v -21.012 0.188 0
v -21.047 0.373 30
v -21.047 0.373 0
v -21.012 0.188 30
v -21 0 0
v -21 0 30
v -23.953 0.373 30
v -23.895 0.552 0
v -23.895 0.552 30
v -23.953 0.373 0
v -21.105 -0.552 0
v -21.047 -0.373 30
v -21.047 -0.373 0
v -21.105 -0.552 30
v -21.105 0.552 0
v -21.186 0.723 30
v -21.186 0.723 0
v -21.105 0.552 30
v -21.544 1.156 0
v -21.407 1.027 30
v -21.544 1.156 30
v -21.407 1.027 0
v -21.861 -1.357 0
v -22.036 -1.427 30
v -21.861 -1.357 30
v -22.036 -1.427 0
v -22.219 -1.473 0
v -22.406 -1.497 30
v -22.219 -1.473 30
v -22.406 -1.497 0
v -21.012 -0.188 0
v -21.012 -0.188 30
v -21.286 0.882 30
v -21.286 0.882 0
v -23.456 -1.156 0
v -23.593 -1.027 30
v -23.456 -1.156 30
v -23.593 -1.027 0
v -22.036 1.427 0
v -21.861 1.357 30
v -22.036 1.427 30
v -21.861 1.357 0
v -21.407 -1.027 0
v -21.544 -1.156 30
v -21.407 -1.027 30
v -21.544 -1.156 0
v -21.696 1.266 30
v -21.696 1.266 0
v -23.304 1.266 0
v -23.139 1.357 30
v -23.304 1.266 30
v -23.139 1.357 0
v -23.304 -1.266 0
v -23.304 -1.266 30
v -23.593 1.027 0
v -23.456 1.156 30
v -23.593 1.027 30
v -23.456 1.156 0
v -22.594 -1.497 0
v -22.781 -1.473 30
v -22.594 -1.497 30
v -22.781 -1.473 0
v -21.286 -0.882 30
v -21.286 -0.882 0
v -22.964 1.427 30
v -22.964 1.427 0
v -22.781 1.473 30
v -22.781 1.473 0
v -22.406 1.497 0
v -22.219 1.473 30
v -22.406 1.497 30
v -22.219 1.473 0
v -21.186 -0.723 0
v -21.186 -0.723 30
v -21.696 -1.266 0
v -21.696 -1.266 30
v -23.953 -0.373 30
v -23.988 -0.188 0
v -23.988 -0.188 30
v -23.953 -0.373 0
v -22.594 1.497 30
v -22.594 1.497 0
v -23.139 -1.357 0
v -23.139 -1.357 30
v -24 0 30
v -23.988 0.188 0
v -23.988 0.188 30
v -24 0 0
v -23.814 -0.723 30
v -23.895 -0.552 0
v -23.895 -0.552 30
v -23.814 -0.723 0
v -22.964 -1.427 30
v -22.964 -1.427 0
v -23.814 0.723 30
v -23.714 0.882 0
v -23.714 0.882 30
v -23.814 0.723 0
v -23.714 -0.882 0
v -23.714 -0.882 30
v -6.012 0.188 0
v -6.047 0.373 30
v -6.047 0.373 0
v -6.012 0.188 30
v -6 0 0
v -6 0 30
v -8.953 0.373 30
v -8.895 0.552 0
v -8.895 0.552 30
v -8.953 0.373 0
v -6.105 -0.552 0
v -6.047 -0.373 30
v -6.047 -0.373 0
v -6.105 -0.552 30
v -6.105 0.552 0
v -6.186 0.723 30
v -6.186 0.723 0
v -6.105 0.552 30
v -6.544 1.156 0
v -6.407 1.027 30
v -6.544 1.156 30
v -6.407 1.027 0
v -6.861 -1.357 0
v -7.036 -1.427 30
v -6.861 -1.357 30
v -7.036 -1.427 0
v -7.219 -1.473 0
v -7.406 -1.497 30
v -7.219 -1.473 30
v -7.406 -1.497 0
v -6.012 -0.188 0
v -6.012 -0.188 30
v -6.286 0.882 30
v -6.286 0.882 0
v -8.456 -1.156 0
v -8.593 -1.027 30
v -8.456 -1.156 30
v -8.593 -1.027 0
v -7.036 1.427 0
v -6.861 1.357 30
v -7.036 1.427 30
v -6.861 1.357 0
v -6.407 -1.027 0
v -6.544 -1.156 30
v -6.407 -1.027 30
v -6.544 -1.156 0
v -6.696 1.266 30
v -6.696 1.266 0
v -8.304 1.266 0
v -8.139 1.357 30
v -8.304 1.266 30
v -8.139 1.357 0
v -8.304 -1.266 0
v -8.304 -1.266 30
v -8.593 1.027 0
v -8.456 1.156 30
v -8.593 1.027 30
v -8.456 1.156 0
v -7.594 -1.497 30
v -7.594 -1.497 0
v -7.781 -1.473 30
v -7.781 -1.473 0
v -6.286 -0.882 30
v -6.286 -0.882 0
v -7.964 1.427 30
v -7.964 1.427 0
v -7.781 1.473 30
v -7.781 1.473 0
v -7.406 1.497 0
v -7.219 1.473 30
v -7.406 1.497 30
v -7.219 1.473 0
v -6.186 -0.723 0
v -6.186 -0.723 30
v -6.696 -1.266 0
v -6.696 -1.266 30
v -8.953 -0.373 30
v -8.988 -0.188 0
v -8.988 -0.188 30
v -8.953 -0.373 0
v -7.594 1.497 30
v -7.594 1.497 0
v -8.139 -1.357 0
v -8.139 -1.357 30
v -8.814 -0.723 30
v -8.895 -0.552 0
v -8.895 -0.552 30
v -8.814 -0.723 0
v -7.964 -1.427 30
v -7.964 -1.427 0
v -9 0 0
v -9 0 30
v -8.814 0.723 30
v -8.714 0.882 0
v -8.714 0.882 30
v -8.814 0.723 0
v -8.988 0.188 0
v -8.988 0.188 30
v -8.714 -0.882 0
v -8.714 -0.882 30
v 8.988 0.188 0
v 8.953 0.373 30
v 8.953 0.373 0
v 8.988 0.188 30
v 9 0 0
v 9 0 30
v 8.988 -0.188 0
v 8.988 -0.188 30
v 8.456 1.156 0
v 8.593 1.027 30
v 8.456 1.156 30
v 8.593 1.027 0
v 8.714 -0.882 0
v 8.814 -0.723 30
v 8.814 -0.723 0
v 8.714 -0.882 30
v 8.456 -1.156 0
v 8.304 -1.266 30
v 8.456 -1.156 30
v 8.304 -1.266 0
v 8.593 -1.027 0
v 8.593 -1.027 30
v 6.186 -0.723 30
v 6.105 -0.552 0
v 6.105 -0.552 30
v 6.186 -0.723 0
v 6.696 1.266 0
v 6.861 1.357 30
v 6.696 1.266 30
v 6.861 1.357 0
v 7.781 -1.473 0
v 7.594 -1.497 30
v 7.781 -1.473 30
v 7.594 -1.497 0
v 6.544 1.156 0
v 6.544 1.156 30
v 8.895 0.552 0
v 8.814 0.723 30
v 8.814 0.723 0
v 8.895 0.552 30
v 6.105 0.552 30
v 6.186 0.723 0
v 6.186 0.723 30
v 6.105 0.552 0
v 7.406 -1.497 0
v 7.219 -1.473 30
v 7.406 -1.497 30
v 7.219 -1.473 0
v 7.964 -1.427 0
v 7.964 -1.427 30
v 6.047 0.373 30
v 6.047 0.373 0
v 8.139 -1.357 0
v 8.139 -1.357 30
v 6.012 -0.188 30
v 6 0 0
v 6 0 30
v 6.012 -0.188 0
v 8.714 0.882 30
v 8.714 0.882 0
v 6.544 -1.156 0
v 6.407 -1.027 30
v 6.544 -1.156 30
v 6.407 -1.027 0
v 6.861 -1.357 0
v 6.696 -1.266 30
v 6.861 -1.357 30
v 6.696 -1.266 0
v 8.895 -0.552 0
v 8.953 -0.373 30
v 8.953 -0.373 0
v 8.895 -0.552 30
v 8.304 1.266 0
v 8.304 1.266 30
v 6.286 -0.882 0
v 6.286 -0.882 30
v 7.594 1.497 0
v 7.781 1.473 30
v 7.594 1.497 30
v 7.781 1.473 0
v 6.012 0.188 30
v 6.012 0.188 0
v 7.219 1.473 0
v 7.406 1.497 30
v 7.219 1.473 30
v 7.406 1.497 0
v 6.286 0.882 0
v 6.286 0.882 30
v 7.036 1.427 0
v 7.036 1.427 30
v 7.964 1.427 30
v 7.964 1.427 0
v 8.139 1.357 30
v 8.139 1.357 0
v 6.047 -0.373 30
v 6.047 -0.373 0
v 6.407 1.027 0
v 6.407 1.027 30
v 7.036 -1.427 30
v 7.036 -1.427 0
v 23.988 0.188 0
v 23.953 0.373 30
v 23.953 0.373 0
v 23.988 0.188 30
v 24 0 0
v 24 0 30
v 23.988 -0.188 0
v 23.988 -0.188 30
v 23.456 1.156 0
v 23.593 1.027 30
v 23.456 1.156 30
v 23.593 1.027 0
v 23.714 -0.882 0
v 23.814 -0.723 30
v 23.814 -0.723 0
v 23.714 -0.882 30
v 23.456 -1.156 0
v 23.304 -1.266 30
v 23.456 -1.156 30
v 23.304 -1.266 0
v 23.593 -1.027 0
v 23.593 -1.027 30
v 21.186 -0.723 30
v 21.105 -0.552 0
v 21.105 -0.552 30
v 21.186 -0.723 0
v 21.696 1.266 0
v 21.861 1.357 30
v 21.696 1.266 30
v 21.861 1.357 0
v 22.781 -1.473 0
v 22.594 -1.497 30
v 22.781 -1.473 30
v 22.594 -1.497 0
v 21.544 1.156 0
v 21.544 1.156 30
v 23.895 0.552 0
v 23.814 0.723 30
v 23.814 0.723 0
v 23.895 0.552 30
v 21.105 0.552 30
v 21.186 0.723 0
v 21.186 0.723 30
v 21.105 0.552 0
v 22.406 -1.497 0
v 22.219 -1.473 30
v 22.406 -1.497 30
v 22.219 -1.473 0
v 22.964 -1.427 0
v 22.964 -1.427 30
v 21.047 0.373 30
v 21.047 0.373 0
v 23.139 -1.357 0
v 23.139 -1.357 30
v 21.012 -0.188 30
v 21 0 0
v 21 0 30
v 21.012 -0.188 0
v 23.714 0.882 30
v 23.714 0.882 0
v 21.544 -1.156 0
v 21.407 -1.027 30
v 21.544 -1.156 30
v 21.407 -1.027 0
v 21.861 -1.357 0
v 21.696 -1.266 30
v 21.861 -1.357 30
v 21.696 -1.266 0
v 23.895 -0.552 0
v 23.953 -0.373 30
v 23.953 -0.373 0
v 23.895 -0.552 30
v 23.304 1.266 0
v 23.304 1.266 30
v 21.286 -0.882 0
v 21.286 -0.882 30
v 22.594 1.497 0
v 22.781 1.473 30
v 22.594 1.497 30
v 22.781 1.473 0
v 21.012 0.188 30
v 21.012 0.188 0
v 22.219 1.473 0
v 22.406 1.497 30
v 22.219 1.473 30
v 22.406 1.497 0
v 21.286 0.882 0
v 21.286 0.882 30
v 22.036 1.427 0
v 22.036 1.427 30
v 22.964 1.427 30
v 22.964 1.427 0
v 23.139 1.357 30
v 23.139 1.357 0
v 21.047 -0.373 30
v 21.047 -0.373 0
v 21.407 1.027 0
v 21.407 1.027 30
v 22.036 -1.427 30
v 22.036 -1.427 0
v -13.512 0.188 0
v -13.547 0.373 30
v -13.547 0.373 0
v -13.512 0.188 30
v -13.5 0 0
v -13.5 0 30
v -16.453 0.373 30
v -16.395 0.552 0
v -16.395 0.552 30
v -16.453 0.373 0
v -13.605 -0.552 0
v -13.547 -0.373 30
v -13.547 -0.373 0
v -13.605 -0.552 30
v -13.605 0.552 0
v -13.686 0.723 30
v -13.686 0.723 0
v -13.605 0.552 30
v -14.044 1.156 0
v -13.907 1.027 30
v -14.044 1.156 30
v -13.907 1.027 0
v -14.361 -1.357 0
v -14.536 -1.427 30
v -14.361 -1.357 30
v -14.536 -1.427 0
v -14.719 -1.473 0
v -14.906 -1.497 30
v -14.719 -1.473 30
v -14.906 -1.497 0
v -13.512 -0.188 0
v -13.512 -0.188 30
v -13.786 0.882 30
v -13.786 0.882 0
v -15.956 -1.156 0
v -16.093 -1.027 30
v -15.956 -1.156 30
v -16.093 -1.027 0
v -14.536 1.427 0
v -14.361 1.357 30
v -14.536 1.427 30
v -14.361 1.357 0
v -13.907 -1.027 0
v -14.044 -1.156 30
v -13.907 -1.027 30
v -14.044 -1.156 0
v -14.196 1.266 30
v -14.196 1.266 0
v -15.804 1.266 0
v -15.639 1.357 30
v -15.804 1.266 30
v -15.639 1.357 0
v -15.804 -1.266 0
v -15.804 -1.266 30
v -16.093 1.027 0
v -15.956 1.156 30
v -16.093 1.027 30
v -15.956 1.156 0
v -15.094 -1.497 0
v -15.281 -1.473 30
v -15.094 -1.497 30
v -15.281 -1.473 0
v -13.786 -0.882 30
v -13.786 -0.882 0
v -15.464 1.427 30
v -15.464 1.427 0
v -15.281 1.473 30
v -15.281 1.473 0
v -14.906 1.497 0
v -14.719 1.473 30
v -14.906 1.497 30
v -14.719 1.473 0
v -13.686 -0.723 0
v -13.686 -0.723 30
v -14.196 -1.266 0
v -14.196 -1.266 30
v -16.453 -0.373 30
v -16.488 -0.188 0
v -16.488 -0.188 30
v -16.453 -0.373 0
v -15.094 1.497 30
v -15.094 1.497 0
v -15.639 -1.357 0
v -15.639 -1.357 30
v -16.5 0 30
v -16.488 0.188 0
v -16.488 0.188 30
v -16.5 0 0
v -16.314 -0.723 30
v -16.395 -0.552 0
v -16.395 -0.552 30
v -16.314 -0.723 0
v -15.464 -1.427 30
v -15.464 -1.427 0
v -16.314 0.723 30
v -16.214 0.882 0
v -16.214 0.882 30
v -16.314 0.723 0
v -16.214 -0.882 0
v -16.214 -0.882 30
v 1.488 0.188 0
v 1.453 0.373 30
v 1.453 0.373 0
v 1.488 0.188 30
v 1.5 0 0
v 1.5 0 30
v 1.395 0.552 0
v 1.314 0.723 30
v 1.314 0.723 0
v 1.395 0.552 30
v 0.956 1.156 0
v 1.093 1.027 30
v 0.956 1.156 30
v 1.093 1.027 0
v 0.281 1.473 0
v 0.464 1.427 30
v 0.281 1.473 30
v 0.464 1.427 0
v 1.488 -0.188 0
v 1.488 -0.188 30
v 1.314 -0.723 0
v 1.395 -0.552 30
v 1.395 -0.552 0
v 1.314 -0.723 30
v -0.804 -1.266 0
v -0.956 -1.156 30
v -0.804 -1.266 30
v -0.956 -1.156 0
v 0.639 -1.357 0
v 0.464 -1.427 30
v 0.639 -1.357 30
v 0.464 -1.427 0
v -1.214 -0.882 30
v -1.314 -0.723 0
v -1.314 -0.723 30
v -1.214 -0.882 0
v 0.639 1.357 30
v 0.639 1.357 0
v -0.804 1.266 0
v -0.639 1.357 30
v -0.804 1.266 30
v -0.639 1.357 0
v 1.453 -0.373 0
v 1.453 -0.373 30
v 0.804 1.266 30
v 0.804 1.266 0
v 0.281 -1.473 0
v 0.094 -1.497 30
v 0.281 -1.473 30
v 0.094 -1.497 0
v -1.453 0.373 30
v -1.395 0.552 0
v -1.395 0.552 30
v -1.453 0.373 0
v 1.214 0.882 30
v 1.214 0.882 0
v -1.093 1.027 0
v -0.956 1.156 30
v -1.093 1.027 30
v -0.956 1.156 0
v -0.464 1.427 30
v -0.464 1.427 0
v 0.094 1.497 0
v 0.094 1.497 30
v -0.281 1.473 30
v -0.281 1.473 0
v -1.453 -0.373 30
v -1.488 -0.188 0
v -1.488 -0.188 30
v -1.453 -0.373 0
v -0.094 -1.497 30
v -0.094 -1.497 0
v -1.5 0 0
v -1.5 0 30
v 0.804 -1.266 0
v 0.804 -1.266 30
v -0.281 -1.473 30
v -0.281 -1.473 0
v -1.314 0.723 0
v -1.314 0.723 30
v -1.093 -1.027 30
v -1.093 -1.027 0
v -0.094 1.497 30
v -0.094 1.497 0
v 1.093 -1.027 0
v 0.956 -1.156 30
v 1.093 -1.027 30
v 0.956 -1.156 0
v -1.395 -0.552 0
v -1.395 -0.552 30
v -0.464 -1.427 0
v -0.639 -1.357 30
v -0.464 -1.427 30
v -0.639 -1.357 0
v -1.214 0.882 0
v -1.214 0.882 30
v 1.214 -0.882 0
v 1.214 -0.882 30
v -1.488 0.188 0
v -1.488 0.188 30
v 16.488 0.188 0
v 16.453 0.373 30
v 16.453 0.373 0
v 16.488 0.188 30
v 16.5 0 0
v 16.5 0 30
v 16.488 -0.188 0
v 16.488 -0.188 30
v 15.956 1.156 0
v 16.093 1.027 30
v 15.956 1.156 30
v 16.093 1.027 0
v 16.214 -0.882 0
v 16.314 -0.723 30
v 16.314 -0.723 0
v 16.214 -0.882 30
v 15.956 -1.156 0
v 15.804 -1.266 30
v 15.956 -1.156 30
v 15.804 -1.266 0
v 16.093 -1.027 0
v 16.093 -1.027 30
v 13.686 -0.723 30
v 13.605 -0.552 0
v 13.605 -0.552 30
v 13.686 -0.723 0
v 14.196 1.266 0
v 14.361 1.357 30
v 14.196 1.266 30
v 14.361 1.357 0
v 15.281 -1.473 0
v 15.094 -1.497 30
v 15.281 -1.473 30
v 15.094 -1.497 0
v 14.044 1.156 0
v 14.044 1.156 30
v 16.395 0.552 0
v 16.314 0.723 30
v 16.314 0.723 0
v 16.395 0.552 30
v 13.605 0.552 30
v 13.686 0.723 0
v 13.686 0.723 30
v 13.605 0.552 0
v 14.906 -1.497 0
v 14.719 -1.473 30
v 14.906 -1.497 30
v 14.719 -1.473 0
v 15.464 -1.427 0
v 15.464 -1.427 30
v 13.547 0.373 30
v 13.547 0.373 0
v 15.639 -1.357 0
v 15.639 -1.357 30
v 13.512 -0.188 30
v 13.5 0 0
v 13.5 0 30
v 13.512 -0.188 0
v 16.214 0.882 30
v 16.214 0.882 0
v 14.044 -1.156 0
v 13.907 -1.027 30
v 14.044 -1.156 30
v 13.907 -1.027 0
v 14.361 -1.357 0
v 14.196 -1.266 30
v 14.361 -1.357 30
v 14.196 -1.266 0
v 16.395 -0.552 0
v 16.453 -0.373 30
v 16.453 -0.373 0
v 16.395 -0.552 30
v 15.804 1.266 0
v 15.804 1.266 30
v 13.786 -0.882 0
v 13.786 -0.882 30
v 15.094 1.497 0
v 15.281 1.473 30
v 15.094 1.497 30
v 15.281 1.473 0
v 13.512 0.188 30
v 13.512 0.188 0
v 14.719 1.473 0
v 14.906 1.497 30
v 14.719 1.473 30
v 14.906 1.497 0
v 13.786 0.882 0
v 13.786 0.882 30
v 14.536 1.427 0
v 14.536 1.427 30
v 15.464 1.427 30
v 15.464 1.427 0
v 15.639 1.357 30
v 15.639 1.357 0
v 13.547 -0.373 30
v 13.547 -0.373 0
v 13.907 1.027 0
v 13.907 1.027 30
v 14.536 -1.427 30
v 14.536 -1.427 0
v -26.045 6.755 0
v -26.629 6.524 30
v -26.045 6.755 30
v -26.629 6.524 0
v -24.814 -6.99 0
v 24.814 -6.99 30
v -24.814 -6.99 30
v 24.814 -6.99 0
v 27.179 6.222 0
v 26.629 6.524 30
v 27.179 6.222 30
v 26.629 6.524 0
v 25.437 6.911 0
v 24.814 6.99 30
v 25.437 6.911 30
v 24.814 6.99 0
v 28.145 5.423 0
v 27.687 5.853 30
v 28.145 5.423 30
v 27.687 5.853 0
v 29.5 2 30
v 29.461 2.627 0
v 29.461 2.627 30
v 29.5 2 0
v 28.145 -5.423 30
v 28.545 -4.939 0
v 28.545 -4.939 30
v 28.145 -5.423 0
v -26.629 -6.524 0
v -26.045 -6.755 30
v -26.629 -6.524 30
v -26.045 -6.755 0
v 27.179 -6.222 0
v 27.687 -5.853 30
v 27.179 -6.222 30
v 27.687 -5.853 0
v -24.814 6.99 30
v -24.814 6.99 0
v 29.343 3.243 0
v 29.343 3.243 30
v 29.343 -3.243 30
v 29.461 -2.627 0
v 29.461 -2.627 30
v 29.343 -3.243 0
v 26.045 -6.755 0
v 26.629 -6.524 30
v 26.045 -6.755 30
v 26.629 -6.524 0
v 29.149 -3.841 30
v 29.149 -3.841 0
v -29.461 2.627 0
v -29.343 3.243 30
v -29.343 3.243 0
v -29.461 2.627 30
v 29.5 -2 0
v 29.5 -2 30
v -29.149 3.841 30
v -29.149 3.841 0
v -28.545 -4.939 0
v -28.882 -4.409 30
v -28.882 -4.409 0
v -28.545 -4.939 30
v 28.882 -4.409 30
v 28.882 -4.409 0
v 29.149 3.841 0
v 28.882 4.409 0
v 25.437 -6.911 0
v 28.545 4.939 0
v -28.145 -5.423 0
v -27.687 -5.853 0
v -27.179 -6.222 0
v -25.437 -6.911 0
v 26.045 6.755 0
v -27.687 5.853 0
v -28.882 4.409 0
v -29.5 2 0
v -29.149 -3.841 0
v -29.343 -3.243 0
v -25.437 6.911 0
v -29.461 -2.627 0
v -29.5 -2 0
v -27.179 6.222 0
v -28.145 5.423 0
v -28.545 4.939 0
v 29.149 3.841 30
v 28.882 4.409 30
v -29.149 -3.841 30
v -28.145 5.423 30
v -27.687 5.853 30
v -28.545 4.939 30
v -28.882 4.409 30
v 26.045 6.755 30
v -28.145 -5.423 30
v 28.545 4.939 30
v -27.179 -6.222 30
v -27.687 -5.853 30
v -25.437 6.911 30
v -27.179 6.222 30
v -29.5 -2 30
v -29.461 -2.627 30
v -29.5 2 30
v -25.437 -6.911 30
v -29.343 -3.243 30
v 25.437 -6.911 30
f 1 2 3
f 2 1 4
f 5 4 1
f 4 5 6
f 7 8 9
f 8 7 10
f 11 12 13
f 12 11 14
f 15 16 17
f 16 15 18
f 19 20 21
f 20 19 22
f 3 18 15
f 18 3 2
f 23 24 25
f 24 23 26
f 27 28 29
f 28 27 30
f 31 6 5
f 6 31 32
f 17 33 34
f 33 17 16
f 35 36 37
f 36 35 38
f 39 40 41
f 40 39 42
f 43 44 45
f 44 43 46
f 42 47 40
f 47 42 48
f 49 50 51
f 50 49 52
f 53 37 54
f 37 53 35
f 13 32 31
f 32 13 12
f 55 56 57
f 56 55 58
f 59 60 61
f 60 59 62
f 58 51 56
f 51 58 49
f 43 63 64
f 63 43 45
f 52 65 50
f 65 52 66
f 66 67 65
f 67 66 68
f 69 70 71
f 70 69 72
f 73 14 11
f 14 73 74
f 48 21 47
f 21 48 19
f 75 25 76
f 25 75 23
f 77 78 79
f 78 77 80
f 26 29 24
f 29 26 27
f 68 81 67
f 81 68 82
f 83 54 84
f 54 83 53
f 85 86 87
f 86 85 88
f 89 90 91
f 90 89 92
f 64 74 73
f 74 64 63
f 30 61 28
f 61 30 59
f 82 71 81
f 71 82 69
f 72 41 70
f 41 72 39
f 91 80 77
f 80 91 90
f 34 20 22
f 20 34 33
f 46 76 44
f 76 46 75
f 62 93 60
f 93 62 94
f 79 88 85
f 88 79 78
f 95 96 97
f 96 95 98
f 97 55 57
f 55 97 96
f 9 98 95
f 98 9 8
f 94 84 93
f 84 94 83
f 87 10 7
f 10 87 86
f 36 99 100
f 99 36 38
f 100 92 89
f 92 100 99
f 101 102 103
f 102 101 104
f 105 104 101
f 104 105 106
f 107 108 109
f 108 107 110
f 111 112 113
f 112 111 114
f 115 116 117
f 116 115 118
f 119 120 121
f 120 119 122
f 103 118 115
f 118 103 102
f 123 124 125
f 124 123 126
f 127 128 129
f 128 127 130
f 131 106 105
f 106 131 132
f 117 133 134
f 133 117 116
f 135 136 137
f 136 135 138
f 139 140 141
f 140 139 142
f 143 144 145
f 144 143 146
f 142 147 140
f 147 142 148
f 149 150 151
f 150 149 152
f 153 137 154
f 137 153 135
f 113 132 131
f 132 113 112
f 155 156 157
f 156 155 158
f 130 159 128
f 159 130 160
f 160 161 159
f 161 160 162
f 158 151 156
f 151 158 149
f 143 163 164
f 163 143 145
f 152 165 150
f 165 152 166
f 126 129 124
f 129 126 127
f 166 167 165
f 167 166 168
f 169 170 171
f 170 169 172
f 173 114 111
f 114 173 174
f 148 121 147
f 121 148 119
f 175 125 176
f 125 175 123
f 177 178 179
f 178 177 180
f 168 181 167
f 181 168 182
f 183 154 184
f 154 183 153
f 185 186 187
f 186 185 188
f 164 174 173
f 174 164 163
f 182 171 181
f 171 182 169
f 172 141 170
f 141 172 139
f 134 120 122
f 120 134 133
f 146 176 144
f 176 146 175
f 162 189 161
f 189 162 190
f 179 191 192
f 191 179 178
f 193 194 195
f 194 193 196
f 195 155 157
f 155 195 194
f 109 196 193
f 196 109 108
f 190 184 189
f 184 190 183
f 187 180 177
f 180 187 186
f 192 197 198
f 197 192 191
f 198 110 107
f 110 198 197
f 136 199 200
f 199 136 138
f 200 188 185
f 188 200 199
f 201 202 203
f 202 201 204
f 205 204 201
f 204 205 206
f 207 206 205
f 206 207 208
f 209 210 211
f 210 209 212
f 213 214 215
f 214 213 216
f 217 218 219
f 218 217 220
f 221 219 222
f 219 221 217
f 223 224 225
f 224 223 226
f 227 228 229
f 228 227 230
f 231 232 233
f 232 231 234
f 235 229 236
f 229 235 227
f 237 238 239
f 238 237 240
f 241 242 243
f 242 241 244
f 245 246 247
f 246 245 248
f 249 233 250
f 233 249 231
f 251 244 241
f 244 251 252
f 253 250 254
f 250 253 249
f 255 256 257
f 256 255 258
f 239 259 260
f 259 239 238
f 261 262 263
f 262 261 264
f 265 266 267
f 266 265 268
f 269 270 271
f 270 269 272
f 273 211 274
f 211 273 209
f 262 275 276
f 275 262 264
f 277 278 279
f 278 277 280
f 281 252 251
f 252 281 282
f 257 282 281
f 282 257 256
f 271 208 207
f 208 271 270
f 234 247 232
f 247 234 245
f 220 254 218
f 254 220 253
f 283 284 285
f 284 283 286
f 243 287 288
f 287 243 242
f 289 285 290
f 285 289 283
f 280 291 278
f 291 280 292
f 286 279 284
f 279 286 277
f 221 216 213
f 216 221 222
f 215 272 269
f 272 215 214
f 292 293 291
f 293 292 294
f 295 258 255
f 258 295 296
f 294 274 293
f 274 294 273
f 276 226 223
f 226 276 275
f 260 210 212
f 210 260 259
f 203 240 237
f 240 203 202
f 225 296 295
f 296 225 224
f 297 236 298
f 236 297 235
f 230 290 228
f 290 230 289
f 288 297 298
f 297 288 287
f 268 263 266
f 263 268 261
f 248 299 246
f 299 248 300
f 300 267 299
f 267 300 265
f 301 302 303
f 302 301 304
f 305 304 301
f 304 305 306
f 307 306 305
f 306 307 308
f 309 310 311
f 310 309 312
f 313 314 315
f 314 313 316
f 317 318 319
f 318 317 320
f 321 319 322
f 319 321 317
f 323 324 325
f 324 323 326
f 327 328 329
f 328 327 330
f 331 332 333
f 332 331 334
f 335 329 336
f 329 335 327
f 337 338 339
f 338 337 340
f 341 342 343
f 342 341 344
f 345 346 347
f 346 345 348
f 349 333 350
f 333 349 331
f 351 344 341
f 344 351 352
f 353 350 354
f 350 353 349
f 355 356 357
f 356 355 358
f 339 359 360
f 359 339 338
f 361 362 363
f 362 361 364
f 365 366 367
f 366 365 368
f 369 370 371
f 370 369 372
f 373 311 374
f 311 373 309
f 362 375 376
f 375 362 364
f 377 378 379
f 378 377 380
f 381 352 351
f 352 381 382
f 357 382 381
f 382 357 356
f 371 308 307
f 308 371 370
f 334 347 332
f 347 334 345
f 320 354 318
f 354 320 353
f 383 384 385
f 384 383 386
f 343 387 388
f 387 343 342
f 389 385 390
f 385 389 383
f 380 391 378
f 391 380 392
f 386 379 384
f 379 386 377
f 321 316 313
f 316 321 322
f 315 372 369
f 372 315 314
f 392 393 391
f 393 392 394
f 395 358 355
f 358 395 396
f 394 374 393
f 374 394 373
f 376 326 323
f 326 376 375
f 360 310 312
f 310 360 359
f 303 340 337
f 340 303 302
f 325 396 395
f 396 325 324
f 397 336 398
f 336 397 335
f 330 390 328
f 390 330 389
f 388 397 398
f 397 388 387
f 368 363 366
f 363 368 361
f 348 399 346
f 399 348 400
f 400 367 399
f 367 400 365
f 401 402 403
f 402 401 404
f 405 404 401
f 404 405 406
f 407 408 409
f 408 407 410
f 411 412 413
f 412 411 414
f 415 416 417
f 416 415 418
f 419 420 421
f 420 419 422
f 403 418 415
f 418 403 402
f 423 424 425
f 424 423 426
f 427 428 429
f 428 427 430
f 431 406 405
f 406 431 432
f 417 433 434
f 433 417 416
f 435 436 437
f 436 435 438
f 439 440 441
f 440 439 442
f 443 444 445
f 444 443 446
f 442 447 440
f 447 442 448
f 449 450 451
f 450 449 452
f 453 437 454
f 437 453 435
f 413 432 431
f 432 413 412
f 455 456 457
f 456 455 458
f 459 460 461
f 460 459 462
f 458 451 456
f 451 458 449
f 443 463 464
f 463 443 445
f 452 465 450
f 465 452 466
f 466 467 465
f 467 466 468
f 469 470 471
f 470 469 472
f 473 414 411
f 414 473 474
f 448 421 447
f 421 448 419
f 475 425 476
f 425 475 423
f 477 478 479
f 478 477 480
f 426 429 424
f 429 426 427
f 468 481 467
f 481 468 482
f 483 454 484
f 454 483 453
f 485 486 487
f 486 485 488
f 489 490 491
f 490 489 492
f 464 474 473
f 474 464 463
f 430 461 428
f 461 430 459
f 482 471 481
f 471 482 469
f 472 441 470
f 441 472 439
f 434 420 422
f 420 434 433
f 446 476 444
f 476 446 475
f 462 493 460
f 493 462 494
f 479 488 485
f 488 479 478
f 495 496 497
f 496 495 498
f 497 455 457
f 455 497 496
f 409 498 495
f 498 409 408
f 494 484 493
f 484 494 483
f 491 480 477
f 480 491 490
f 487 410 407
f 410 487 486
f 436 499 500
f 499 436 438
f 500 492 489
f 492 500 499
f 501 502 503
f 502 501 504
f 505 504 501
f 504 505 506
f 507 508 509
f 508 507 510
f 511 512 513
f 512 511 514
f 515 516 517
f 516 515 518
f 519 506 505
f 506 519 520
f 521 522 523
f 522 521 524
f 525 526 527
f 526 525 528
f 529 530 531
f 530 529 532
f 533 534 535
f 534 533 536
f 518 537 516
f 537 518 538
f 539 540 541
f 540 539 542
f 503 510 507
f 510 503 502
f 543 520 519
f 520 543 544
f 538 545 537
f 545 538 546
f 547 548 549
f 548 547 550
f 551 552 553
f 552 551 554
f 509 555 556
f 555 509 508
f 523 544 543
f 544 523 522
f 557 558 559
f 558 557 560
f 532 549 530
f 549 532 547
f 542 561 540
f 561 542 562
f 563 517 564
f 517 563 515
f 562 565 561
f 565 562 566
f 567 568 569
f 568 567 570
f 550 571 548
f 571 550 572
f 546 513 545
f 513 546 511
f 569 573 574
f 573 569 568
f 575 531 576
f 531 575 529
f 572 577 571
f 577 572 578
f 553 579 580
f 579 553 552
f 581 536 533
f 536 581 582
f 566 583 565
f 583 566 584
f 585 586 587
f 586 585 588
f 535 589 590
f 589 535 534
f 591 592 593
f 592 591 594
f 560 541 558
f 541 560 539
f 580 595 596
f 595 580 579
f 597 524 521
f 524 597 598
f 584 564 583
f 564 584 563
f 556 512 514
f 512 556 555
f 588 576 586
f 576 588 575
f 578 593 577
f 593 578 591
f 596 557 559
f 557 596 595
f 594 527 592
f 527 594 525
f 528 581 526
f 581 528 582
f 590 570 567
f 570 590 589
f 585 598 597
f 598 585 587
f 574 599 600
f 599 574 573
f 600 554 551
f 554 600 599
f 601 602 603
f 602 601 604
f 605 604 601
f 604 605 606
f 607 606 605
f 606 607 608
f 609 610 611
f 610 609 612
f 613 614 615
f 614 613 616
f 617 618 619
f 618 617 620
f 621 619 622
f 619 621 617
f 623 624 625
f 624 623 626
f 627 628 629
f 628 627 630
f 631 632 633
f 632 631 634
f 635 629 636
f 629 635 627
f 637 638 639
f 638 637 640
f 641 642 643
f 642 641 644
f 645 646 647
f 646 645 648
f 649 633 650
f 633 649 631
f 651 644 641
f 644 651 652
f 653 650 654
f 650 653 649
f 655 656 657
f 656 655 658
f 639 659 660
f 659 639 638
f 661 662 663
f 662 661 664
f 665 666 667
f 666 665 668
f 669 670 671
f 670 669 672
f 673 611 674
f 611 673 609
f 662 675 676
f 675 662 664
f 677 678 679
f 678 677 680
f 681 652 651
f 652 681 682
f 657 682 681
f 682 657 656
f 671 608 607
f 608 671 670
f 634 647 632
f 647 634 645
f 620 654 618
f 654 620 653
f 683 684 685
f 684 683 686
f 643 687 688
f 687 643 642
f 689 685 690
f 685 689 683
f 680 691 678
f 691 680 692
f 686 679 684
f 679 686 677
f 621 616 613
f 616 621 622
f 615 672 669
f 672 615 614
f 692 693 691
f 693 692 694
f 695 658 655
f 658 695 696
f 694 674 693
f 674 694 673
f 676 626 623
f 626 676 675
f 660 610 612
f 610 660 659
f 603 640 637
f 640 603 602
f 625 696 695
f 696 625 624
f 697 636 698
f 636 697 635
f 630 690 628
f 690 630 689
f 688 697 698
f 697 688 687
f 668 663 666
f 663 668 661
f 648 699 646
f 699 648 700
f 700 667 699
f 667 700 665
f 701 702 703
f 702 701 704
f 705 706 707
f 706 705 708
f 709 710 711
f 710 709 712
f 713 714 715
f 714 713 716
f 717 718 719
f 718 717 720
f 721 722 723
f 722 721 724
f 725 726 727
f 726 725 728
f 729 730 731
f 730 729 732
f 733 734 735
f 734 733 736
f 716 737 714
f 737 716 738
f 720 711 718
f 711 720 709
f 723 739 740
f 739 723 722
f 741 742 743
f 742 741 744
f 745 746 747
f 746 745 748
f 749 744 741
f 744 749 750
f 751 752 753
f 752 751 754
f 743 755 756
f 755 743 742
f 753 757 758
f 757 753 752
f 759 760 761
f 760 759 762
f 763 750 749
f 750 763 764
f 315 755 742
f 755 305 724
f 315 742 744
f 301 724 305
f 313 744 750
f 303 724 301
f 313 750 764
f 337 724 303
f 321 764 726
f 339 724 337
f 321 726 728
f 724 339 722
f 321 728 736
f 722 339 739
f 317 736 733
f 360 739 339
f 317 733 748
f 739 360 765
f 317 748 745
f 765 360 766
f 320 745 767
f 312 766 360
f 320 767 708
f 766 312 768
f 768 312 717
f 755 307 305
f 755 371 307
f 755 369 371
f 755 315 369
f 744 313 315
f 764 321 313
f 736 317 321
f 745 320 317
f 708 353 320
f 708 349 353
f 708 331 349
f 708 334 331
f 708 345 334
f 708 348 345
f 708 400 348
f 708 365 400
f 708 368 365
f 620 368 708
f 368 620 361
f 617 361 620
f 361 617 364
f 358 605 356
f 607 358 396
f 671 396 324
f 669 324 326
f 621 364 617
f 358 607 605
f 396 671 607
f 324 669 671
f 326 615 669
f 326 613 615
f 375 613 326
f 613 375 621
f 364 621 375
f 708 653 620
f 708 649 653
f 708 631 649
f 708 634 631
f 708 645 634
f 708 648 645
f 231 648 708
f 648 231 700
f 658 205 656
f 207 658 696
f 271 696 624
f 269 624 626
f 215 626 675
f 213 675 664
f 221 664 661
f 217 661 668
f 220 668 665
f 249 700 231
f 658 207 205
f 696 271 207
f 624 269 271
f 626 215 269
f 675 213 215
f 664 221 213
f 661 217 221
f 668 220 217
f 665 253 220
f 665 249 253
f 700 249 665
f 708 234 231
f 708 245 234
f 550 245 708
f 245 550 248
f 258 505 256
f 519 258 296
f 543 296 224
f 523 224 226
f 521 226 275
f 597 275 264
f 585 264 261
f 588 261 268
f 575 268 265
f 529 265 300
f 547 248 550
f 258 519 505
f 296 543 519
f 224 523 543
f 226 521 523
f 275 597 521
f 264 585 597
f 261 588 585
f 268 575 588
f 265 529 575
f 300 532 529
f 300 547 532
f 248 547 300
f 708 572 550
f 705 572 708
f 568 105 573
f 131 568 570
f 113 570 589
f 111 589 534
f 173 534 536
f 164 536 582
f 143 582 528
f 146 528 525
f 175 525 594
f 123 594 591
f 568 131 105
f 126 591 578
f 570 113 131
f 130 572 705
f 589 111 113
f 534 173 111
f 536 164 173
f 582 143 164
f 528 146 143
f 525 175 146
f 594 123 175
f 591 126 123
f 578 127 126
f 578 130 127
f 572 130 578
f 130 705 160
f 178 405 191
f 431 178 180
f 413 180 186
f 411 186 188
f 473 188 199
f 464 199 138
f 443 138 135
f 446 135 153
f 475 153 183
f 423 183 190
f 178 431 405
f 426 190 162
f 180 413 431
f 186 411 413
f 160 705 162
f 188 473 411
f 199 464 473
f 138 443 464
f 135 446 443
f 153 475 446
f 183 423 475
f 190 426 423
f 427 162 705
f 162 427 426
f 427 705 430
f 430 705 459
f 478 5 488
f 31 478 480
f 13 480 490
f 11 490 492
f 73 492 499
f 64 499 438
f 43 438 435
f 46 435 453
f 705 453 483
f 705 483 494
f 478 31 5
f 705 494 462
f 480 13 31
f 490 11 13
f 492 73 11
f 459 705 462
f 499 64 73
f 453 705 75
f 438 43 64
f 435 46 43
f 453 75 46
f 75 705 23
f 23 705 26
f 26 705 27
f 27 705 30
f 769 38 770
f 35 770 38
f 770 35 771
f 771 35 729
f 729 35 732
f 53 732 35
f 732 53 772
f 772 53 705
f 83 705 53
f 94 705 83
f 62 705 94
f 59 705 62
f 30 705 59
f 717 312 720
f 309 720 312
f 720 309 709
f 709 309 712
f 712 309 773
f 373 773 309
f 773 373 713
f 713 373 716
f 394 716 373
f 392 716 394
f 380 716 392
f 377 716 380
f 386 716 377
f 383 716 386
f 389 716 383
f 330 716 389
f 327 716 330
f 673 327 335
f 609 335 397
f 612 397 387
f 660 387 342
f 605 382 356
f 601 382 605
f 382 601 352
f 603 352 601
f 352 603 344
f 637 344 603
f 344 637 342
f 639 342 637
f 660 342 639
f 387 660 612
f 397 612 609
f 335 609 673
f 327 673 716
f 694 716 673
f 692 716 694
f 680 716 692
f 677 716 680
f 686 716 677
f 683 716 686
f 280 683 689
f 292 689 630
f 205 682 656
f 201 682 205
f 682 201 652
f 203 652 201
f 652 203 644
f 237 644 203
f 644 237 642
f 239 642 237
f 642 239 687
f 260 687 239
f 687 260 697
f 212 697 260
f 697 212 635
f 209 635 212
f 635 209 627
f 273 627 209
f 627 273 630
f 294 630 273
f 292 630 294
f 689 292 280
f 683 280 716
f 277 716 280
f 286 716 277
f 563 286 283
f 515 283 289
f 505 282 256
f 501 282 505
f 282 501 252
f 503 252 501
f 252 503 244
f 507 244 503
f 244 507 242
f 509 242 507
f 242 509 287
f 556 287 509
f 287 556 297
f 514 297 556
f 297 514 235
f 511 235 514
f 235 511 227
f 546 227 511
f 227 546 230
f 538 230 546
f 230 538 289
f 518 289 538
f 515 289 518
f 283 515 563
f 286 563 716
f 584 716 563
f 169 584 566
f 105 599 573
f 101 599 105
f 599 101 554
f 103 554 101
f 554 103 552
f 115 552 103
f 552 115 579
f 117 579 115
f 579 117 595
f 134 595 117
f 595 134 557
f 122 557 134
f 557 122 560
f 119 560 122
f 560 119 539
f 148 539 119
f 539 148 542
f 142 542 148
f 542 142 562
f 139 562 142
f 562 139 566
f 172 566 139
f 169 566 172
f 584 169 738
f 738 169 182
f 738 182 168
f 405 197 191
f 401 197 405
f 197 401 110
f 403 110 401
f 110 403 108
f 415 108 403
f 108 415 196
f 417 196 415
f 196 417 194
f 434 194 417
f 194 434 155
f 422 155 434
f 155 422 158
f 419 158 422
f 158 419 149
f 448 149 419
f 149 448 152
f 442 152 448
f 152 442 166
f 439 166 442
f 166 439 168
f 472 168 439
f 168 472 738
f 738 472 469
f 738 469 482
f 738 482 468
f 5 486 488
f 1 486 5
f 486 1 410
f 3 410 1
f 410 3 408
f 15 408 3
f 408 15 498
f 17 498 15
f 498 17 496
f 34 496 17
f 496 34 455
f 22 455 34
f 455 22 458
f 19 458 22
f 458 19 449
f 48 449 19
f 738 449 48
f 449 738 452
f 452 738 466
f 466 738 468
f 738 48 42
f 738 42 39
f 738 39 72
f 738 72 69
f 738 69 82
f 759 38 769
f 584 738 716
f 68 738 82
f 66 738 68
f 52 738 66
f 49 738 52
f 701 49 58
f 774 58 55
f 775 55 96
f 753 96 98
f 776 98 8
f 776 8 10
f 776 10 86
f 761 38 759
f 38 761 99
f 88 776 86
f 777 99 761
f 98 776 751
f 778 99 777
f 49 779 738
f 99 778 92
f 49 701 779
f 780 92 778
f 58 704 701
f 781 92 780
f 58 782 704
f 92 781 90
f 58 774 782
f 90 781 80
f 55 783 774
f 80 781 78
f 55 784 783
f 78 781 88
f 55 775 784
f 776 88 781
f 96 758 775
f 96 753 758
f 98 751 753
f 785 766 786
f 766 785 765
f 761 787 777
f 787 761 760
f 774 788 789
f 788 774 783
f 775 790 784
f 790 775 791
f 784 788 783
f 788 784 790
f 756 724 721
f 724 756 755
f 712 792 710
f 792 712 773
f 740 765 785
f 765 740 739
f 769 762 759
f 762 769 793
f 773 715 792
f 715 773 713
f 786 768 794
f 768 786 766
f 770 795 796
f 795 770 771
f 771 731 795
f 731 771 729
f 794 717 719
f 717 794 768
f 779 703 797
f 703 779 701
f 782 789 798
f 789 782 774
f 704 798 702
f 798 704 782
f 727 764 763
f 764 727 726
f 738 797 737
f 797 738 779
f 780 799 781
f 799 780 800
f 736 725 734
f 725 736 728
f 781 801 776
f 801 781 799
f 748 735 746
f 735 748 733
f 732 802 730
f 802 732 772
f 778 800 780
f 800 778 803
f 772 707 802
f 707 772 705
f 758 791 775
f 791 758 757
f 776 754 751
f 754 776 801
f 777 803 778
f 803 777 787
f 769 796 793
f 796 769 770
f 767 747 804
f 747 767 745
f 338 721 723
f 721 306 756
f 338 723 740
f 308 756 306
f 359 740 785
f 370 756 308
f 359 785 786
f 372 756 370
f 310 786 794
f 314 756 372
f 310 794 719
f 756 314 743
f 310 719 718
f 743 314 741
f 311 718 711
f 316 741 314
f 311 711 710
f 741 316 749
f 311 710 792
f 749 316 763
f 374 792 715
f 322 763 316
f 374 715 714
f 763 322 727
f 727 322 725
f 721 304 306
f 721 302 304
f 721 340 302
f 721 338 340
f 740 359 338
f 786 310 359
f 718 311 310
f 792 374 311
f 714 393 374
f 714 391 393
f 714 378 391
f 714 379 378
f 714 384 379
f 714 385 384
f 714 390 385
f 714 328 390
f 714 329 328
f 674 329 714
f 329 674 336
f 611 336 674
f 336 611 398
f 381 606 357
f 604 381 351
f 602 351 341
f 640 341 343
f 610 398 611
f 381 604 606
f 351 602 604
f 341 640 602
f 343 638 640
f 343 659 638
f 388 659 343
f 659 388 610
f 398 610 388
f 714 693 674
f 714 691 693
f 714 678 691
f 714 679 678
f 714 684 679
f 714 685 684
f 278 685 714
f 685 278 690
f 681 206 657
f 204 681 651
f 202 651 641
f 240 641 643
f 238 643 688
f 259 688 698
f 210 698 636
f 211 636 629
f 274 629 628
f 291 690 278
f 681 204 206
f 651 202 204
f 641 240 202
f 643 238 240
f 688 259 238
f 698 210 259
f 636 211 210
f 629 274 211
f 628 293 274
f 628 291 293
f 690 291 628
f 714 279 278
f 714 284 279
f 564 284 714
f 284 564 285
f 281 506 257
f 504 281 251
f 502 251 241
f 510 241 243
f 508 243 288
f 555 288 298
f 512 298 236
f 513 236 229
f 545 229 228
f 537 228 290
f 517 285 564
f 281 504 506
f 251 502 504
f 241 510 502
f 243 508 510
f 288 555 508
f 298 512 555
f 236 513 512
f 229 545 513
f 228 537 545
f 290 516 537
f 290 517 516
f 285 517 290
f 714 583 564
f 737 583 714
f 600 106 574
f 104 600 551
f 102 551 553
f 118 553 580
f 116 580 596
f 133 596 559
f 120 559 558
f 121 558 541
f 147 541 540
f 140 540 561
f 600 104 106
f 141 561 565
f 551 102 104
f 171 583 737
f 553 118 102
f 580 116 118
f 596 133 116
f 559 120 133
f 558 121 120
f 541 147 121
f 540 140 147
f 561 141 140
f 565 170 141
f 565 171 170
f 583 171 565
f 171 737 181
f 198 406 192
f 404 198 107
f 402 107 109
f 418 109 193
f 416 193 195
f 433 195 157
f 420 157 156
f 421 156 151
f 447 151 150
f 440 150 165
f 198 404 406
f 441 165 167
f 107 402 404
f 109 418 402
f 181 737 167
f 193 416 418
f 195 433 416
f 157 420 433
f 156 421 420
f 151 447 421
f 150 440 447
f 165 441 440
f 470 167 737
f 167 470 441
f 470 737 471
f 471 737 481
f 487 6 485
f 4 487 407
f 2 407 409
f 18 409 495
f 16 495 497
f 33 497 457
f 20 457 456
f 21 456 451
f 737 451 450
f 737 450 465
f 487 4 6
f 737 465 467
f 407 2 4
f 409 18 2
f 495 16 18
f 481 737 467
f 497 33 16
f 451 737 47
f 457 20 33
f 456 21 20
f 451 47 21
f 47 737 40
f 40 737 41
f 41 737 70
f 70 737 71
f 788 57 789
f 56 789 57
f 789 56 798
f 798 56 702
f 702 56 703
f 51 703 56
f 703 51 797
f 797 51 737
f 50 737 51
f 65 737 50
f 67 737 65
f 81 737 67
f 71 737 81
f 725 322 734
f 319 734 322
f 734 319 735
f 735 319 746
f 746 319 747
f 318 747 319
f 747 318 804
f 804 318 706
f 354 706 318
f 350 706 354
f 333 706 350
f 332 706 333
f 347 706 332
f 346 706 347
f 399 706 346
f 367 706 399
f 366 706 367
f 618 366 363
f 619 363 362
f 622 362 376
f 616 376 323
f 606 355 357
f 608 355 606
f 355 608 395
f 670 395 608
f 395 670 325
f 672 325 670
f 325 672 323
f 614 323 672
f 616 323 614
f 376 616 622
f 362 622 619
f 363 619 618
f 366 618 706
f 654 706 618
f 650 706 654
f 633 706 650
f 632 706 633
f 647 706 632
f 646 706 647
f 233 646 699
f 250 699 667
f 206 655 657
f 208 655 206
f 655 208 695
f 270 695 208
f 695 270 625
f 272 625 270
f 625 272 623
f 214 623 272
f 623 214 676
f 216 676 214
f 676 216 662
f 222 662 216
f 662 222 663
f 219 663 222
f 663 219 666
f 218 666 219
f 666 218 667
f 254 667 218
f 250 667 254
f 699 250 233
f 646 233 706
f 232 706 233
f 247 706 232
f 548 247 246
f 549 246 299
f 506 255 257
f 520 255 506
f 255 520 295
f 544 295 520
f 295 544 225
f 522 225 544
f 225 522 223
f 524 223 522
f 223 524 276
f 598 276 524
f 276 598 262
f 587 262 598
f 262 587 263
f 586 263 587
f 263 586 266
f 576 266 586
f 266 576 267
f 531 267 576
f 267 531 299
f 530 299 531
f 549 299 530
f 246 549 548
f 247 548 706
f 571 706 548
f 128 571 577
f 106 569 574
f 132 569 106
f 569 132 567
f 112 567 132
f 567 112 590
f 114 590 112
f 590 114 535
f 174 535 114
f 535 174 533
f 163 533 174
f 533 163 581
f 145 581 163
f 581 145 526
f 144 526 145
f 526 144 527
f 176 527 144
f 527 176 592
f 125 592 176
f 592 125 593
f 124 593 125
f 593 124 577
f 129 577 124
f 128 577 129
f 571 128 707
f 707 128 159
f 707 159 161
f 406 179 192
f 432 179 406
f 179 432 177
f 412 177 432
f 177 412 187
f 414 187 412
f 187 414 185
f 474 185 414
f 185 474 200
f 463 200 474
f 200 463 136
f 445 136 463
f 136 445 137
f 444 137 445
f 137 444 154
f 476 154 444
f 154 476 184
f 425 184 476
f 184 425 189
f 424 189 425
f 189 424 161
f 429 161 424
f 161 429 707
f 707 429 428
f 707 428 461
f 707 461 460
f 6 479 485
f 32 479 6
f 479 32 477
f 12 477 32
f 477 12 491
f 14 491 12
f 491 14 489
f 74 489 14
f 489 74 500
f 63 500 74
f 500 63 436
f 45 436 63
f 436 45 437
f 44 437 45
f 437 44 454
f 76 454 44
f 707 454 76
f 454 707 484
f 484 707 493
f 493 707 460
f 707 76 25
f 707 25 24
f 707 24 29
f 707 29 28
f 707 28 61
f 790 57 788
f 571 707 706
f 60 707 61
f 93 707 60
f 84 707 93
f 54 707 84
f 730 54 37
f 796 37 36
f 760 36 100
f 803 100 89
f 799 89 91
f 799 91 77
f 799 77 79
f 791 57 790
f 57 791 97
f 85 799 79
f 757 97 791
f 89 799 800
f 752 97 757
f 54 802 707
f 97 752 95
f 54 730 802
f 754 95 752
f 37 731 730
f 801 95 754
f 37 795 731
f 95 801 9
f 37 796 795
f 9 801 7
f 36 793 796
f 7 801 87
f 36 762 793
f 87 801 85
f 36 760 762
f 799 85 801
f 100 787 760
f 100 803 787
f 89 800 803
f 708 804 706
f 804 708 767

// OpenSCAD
$fn = 50;


difference() {
	union() {
		hull() {
			translate(v = [-24.5000000000, 2.0000000000, 0]) {
				cylinder(h = 30, r = 5);
			}
			translate(v = [24.5000000000, 2.0000000000, 0]) {
				cylinder(h = 30, r = 5);
			}
			translate(v = [-24.5000000000, -2.0000000000, 0]) {
				cylinder(h = 30, r = 5);
			}
			translate(v = [24.5000000000, -2.0000000000, 0]) {
				cylinder(h = 30, r = 5);
			}
		}
	}
	union() {
		translate(v = [-22.5000000000, 0.0000000000, 0]) {
			translate(v = [0, 0, -100]) {
				cylinder(h = 200, r = 1.5000000000);
			}
		}
		translate(v = [-7.5000000000, 0.0000000000, 0]) {
			translate(v = [0, 0, -100]) {
				cylinder(h = 200, r = 1.5000000000);
			}
		}
		translate(v = [7.5000000000, 0.0000000000, 0]) {
			translate(v = [0, 0, -100]) {
				cylinder(h = 200, r = 1.5000000000);
			}
		}
		translate(v = [22.5000000000, 0.0000000000, 0]) {
			translate(v = [0, 0, -100]) {
				cylinder(h = 200, r = 1.5000000000);
			}
		}
		translate(v = [-22.5000000000, 0.0000000000, 0]) {
			translate(v = [0, 0, -100]) {
				cylinder(h = 200, r = 1.5000000000);
			}
		}
		translate(v = [-15.0000000000, 0.0000000000, 0]) {
			translate(v = [0, 0, -100]) {
				cylinder(h = 200, r = 1.5000000000);
			}
		}
		translate(v = [-7.5000000000, 0.0000000000, 0]) {
			translate(v = [0, 0, -100]) {
				cylinder(h = 200, r = 1.5000000000);
			}
		}
		translate(v = [0, 0, -100]) {
			cylinder(h = 200, r = 1.5000000000);
		}
		translate(v = [7.5000000000, 0.0000000000, 0]) {
			translate(v = [0, 0, -100]) {
				cylinder(h = 200, r = 1.5000000000);
			}
		}
		translate(v = [15.0000000000, 0.0000000000, 0]) {
			translate(v = [0, 0, -100]) {
				cylinder(h = 200, r = 1.5000000000);
			}
		}
		translate(v = [22.5000000000, 0.0000000000, 0]) {
			translate(v = [0, 0, -100]) {
				cylinder(h = 200, r = 1.5000000000);
			}
		}
	}
}
